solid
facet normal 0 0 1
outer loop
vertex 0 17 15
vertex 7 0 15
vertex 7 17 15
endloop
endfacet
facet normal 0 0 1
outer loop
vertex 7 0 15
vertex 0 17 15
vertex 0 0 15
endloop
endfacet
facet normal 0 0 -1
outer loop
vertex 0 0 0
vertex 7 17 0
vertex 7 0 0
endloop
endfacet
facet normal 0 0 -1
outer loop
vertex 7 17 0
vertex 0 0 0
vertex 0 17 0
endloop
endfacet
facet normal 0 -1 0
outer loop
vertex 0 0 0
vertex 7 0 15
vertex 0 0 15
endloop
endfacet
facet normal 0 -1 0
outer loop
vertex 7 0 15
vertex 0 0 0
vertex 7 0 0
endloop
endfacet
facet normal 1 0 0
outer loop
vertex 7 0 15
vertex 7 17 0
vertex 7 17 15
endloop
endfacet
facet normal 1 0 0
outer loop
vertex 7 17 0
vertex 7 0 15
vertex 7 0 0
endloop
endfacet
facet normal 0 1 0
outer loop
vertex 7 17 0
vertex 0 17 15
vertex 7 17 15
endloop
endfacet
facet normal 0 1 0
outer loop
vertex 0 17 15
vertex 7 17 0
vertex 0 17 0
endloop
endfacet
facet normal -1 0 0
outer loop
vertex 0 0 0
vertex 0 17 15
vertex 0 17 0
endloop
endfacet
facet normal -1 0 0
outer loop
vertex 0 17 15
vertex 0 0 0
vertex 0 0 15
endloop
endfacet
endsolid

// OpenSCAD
// Generated by SolidPython 1.0.1 on 2020-07-29 00:46:55


cube(size = [7, 17, 15]);
/***********************************************
*********      SolidPython code:      **********
************************************************
 
# import packages: SolidPython
from solid import *
from solid.utils import *
from itertools import chain, combinations, permutations


class Resize:

    def __init__(self, scad_file):
        self.scad_file = scad_file
        #self.scad_file = import_scad(scad_file)
        # cone/cylinder param:
        self.r1 = 0
        self.r2 = 0
        self.h = 0
        # rectangular prism param:
        self.w = 0
        self.l = 0
        # ellipse param:
        self.r = 0

    # import OpenScad code (file name corresponds to shape)


    # classify shape + parameters
    def assign(self, param1, param2, param3):
        if self.scad_file == 'cone.scad':
            self.r1 = param1
            self.r2 = param2
            self.h = param3
        elif self.scad_file == 'cylinder.scad':
            self.r1 = param1
            self.r2 = param2
            self.h = param3
        elif self.scad_file == 'rectangularPrism.scad':
            self.h = param1
            self.l = param2
            self.w = param3
        else:
            self.r = param1
            self.h = param2

    # resize parameters
    def iterate(self):
        x = range(3, 20, 2)
        i = 1
        if self.scad_file == 'cone.scad':
            tempList = list(permutations(x, 2))
            for temp in tempList:
                param1 = temp[0]
                param2 = temp[1]
                filepath = 'produced_scad_files/' + 'cone' + str(param1) + '_' + str(param2) + '_' + '.scad'
                scad_render_to_file(cylinder(h=param1, r1=param2, r2=0), filepath)

        elif self.scad_file == 'cylinder.scad':
            tempList = list(permutations(x, 3))
            for temp in tempList:
                param1 = temp[0]
                param2 = temp[1]
                filepath = 'produced_scad_files/' + 'cylinder' + str(param1) + '_' + str(param2) + '_' + '.scad'
                scad_render_to_file(cylinder(h=param1, r1=param2, r2=param2), filepath)

        elif self.scad_file == 'rectangularPrism.scad':
            tempList = list(permutations(x, 3))
            for temp in tempList:
                param1 = temp[0]
                param2 = temp[1]
                param3 = temp[2]
                filepath = 'produced_scad_files/' + 'rectangularPrism' + str(param1) + '_' + str(param2) + '_' + str(
                    param3) + '.scad'
                scad_render_to_file(cube(size=(param1, param2, param3)), filepath)

        elif self.scad_file == 'ellipse.scad':
            tempList = list(permutations(x, 4))
            for temp in tempList:
                param1 = temp[0]
                param2 = temp[1]
                param3 = temp[2]
                param4 = temp[3]
                filepath = 'produced_scad_files/' + 'ellipse' + str(param1) + '_' + str(param2) + '_' + str(param3) + '_' + str(param4) + '.scad'
                scad_render_to_file(scale([param1, param2, param3])(sphere(r=param4)), filepath)

    def render_to_scadfile(self):
        scad_render_to_file(scad, 'example.scad') 
 
************************************************/
